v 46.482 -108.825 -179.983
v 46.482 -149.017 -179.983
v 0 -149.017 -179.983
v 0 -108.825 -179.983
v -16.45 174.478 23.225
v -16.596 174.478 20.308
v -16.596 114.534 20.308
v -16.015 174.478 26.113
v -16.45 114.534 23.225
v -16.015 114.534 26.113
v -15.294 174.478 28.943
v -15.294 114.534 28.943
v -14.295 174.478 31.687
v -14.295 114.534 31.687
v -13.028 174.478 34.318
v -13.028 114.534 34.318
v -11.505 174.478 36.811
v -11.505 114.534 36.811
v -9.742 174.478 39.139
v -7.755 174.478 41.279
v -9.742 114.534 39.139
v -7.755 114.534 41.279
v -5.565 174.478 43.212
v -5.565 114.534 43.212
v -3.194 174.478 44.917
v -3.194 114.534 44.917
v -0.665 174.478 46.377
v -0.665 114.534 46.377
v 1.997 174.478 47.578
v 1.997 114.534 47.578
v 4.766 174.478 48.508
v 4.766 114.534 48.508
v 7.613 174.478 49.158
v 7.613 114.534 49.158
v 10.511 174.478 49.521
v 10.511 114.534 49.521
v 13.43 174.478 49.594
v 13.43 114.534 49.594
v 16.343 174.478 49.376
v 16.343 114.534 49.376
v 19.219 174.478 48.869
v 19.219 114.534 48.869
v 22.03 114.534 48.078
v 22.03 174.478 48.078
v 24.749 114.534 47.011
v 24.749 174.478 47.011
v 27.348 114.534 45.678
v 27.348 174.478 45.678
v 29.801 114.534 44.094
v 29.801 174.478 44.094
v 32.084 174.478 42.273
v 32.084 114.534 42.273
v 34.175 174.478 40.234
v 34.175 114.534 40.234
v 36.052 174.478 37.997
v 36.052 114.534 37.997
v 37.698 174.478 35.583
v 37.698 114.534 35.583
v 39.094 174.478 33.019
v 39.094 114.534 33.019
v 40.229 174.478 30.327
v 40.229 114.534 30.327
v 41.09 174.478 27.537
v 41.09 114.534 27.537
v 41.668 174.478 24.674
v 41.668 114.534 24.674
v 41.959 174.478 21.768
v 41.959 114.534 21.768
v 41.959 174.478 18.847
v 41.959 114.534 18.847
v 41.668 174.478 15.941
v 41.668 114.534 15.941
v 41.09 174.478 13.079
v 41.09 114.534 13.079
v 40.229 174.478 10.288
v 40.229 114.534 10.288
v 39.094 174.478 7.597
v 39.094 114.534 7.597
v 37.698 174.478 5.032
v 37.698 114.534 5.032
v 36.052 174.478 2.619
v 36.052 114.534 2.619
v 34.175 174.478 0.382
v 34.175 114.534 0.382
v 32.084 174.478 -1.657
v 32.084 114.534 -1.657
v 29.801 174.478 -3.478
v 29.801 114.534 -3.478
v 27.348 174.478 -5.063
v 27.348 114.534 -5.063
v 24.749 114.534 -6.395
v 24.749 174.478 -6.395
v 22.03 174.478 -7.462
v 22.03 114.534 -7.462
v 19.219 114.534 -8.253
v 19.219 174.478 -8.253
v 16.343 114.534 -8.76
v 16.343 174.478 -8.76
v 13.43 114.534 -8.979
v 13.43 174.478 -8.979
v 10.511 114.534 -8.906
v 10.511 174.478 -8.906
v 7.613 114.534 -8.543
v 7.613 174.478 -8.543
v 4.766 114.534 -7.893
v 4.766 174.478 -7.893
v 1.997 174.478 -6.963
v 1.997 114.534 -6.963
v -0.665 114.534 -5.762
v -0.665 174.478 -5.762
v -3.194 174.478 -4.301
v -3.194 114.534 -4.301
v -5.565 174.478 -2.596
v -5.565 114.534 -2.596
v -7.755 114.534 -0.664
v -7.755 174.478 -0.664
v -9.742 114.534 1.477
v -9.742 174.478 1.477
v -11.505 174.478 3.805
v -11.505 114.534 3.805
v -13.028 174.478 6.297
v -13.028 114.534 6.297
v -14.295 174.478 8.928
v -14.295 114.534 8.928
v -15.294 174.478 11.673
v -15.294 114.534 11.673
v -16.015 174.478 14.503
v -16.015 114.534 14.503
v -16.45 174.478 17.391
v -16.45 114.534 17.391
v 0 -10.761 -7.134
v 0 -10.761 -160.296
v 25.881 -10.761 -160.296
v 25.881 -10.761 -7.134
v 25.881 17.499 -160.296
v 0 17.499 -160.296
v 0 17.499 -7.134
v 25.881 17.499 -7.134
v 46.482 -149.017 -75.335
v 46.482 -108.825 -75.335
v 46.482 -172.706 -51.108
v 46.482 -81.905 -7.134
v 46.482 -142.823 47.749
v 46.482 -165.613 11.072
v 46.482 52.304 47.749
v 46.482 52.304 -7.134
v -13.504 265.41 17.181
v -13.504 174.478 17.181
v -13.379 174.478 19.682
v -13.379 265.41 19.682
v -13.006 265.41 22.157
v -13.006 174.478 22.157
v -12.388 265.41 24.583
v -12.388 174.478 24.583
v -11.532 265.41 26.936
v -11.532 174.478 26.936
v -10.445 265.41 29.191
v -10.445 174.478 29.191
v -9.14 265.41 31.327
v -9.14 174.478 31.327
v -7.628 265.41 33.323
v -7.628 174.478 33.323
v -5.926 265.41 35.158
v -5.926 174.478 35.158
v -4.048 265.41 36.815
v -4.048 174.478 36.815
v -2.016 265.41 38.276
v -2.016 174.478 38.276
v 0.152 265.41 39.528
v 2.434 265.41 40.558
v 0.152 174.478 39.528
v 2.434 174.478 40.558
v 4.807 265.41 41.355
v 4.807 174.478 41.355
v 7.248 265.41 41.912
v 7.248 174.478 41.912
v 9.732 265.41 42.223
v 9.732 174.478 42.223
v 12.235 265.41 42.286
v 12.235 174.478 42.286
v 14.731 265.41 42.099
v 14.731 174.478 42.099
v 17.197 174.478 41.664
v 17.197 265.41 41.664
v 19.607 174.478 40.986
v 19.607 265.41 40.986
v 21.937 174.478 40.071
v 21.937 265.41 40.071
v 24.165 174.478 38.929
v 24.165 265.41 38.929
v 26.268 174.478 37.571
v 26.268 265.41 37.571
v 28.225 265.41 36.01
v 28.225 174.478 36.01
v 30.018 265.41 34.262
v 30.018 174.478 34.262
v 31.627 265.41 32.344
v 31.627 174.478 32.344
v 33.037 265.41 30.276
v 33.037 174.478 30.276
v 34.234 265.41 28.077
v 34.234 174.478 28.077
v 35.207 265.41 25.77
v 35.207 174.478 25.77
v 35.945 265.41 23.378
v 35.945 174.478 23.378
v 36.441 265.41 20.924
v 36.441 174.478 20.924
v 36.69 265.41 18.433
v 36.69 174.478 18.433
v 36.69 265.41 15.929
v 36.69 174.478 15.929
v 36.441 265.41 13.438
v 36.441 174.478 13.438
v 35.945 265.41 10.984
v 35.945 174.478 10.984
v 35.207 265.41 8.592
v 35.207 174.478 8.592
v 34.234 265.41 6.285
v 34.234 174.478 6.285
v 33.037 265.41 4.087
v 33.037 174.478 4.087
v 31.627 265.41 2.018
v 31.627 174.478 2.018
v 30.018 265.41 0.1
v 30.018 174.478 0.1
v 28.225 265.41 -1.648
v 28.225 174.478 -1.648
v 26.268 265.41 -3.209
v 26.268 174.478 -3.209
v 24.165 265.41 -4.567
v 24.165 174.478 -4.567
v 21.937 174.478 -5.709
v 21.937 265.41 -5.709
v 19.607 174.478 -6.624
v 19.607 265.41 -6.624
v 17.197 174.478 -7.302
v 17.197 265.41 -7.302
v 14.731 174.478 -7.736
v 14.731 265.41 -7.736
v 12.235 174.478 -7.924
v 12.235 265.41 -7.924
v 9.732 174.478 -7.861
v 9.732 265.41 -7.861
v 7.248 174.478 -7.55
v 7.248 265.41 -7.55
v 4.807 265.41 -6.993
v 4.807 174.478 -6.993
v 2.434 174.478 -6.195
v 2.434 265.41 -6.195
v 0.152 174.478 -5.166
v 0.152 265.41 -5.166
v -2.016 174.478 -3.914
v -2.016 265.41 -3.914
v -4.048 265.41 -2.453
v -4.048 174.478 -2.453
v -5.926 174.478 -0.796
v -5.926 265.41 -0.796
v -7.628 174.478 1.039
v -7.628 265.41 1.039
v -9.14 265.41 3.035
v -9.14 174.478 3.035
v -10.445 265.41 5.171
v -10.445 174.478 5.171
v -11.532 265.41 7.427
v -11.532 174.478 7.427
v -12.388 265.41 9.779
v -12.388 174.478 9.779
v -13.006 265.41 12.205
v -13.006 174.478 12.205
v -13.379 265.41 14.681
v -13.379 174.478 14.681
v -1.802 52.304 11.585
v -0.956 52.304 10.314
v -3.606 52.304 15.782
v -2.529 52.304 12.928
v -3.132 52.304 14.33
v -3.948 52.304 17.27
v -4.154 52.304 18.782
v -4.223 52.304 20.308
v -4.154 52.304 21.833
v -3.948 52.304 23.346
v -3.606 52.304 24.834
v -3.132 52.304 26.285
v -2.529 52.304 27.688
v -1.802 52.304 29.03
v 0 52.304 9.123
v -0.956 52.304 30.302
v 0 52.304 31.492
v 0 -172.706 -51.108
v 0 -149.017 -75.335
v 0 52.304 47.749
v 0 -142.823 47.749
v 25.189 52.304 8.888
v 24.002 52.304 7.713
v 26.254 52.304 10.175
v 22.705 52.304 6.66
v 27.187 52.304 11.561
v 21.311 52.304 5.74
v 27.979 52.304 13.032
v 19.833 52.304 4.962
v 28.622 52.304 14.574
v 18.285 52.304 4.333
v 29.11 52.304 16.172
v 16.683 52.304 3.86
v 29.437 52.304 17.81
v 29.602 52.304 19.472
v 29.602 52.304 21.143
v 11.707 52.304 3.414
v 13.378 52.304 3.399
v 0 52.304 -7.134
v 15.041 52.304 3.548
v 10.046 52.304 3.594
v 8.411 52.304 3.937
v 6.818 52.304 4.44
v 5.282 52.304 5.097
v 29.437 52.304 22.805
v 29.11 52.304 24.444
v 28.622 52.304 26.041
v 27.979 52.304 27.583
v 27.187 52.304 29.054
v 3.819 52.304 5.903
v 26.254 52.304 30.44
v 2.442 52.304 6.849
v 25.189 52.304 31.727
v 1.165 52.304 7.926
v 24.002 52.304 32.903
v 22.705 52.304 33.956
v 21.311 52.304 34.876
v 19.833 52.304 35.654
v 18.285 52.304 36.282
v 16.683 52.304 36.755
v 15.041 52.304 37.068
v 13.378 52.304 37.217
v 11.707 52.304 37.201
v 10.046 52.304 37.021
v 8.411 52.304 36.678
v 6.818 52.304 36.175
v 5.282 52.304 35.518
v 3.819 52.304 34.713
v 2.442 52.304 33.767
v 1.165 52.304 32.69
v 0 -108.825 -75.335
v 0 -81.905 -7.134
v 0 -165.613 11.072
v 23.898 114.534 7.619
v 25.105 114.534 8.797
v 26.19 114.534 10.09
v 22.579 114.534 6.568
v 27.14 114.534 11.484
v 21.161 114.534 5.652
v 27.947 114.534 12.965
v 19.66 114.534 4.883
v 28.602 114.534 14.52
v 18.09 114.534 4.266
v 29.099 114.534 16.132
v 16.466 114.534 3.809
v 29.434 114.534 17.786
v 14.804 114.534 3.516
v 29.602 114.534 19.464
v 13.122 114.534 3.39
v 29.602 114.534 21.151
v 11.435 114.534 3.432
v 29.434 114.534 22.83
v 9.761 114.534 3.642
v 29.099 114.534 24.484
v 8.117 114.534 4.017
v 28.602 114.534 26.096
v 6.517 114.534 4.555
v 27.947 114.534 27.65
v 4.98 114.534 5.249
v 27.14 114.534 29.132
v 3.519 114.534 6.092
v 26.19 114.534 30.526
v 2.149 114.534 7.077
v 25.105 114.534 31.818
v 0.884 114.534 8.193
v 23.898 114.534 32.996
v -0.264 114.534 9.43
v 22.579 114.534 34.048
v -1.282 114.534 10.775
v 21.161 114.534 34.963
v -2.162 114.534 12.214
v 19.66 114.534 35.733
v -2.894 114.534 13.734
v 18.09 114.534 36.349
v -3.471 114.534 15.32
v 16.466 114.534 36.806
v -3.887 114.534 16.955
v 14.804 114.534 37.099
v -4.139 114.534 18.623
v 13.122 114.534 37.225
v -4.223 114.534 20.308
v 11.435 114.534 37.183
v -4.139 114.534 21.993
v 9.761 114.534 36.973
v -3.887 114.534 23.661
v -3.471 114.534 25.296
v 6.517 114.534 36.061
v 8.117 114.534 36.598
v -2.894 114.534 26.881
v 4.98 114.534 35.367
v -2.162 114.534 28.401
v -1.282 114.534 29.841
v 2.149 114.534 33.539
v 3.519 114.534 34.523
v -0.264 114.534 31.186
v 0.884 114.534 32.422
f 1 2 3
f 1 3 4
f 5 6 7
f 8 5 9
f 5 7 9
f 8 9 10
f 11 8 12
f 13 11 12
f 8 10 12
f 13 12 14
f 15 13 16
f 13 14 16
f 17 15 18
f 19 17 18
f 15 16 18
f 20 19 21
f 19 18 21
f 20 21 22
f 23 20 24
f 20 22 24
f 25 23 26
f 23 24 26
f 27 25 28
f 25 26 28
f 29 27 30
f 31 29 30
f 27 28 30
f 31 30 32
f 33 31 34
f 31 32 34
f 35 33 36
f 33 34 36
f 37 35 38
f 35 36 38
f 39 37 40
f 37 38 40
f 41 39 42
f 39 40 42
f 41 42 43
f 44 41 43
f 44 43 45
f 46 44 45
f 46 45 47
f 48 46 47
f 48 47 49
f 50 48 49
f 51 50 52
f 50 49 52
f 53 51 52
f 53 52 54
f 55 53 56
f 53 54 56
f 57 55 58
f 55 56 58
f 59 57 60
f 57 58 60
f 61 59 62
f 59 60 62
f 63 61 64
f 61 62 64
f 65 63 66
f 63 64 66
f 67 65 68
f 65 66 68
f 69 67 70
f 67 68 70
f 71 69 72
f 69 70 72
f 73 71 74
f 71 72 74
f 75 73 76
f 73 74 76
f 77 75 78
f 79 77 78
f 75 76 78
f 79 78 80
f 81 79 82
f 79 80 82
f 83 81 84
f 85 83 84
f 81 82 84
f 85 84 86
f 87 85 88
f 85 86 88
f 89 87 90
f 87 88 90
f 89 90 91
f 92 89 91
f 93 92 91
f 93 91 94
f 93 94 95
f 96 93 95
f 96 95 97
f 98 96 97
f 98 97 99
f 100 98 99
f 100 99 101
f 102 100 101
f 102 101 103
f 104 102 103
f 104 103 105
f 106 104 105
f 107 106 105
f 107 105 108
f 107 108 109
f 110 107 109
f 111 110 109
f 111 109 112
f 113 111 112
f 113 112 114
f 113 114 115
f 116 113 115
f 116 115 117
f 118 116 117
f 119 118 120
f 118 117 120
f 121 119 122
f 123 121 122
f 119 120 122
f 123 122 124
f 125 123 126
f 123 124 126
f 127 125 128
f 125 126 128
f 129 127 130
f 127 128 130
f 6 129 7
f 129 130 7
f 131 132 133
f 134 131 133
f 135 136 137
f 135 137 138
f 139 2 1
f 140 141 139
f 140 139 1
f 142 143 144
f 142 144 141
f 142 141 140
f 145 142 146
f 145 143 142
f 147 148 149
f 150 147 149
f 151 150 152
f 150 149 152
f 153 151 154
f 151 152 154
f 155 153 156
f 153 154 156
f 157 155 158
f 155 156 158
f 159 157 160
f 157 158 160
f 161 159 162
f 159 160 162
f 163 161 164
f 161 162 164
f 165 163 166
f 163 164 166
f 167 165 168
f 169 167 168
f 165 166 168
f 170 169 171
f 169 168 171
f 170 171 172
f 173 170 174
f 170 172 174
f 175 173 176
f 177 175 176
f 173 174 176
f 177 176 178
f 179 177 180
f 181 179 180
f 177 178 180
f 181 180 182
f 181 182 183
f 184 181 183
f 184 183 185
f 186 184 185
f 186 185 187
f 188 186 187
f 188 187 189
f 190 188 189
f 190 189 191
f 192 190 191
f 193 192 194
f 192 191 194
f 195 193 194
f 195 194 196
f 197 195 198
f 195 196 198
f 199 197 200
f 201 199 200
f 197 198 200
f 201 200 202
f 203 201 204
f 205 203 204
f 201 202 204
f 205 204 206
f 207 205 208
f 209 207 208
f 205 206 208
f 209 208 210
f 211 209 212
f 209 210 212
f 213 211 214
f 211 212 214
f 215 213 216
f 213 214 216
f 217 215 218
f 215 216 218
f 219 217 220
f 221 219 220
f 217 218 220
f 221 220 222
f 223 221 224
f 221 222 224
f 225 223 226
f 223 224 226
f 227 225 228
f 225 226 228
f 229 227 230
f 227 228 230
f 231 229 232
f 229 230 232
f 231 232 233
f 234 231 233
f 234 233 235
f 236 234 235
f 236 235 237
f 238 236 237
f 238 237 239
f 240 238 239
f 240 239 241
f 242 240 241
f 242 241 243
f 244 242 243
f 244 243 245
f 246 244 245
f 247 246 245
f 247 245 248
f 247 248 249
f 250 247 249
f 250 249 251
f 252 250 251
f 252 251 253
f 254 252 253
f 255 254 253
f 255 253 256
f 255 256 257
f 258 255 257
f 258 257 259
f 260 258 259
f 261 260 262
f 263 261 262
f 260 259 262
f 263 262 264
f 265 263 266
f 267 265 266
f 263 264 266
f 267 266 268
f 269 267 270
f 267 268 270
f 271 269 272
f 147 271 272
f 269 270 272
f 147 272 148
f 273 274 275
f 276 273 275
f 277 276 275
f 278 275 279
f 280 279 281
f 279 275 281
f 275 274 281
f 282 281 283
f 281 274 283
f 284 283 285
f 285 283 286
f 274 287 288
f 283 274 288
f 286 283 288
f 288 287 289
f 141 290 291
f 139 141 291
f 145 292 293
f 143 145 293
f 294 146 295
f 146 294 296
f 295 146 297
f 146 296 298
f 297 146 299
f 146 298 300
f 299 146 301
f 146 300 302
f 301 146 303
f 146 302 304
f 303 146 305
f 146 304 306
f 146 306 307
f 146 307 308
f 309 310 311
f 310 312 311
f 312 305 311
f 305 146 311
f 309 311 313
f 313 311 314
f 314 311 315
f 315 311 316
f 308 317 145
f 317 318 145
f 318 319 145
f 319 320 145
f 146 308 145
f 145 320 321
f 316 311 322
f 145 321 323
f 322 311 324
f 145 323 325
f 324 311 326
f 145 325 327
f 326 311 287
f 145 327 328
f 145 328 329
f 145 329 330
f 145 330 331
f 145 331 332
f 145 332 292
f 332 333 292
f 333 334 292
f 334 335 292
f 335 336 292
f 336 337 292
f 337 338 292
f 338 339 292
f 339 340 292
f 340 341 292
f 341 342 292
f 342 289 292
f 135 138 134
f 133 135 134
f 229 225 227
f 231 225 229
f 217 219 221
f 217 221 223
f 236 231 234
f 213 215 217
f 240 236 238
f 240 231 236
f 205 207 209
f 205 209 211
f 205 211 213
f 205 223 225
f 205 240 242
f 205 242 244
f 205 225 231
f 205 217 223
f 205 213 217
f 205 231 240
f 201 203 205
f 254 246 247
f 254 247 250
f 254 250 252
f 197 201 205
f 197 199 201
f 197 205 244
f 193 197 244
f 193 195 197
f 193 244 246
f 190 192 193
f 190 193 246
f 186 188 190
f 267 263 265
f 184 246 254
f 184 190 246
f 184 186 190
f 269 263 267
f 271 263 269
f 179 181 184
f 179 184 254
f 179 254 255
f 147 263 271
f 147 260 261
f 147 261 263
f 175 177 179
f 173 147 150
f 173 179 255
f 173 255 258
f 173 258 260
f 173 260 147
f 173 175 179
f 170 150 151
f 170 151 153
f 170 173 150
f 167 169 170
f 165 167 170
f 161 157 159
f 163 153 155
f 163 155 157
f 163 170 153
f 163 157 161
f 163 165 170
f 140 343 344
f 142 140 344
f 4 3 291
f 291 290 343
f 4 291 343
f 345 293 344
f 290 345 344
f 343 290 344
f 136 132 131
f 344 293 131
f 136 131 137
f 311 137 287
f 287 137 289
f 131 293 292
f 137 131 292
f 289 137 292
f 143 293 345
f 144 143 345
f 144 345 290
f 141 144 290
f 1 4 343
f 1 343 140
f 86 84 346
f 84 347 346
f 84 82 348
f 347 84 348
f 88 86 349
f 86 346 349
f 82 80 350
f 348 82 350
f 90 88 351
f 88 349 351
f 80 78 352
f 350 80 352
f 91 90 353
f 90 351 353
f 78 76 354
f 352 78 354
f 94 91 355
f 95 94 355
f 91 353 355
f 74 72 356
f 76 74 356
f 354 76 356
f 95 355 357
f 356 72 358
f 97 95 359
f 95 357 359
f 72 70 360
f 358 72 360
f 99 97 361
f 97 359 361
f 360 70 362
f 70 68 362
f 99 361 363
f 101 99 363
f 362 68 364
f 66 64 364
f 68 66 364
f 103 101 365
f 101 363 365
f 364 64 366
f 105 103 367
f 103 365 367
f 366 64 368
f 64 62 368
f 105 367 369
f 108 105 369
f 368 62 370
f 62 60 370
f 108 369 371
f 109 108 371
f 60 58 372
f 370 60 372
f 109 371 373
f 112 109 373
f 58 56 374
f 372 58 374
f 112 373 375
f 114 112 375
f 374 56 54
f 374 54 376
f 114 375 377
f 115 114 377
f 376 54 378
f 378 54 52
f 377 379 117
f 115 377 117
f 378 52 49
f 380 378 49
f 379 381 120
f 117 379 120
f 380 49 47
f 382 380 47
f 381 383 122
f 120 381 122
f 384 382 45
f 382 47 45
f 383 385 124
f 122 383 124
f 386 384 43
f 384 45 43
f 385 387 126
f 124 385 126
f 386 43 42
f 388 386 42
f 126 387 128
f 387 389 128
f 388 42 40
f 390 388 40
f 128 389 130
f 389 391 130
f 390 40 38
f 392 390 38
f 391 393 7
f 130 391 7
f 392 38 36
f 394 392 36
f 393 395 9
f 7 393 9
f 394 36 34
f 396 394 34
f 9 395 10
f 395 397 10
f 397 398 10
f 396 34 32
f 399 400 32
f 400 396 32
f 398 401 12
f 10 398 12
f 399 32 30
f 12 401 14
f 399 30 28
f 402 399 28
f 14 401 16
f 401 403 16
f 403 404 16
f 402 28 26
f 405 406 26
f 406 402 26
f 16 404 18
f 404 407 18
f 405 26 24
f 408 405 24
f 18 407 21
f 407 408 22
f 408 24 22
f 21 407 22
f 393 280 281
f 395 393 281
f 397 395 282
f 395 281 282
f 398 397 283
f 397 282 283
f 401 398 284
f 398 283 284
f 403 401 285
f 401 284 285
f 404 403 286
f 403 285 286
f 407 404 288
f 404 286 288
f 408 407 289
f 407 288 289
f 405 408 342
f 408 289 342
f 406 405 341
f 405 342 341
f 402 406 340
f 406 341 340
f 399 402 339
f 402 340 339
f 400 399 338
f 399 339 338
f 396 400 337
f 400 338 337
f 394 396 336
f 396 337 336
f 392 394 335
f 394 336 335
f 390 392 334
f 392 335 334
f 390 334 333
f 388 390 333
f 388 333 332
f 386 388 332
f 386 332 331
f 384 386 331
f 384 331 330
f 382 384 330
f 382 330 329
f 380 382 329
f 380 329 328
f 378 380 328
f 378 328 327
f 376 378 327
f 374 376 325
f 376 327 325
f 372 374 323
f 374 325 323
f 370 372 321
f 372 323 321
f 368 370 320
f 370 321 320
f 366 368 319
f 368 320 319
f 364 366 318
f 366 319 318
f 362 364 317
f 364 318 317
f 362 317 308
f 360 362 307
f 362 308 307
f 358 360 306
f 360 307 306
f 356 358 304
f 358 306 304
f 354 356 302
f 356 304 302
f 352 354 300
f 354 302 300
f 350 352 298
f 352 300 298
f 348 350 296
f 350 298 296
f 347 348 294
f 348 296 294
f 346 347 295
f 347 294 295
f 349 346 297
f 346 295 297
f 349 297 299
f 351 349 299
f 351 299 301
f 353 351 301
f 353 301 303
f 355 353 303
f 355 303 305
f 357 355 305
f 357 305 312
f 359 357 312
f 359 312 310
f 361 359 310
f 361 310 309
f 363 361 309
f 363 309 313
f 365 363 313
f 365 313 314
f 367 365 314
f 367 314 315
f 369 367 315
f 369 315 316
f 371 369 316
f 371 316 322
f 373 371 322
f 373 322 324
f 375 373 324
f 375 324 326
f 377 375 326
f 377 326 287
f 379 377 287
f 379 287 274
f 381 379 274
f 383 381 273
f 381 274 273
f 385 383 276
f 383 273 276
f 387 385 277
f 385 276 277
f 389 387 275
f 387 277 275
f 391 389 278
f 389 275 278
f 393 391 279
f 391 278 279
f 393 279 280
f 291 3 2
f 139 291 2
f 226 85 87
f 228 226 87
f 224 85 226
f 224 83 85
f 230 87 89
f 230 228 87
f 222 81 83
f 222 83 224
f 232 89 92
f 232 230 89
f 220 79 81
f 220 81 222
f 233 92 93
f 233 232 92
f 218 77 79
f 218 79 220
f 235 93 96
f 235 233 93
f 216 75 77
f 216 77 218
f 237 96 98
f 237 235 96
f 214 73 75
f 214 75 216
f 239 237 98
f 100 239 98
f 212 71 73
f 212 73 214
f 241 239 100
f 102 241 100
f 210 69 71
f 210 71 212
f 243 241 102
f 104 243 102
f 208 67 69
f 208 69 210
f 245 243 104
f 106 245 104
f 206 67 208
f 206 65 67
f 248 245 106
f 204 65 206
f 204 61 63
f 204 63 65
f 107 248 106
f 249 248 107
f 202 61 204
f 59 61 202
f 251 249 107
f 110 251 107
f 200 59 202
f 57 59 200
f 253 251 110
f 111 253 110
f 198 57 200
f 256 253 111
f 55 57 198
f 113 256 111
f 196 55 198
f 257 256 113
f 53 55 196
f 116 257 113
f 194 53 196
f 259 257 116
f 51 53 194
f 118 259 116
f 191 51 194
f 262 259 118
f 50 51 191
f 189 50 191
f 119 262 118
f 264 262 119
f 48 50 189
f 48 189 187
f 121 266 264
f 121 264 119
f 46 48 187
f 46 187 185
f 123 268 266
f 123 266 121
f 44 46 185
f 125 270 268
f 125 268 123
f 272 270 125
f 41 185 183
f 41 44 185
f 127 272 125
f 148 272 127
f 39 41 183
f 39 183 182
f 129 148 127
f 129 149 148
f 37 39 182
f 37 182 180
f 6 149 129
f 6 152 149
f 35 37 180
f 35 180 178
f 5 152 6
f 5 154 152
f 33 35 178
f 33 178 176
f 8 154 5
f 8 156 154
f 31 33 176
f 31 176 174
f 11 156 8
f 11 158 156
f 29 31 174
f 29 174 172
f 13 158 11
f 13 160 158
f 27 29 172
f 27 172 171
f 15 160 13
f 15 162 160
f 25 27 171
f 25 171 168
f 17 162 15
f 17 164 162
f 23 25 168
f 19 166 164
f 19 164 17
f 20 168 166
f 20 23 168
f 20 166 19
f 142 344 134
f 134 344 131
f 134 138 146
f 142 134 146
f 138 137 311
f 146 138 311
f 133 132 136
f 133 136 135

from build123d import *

# Parameters (mm, degrees)
F0_W      = 134.2095732689
F0_H      = 54.8827461898
F1_DEPTH  = 25.4
F2_R      = 16.9227775992
F3_DEPTH  = 62.23
F4_R      = 29.2955411645
F5_DEPTH  = 59.944
F6_DEPTH  = 46.482
F8_W      = 25.8811749518
F8_H      = 28.2603334635
F9_DEPTH  = 153.162
F11_R     = 25.1124764346
F12_DEPTH = 90.932
F13_DEPTH = 104.648


with BuildPart() as f1:
    # F0 (on Right) → F1 (new body)
    with BuildSketch(Plane.YZ):
        Polygon((-81.9051712751, -7.1336217225), (-81.9051712751, 47.7491244674), (-142.8231298923, 47.7491244674), (-165.6134873629, 11.0719772056), (-172.7062016726, -51.1080250144), (-149.0172445774, -75.3351673484), (-108.8246330619, -75.3351673484), align=None)
        with Locations((-14.8003846407, 20.3077513725)):
            Rectangle(F0_W, F0_H)
    extrude(amount=F1_DEPTH)

    # F2 (on face) → F3 (join)
    with BuildSketch(Plane(origin=(0, 52.3044019938, 0), x_dir=(-1, 0, 0), z_dir=(0, 1, 0))):
        with Locations((-12.7, 20.3077513725)):
            Circle(F2_R)
    extrude(amount=F3_DEPTH)

    # F4 (on face) → F5 (join)
    with BuildSketch(Plane(origin=(0, 114.5344019938, 0), x_dir=(-1, 0, 0), z_dir=(0, 1, 0))):
        with Locations((-12.7, 20.3077513725)):
            Circle(F4_R)
    extrude(amount=F5_DEPTH)

    # F0 (on Right) → F6 (join)
    with BuildSketch(Plane.YZ):
        Polygon((-81.9051712751, -7.1336217225), (-81.9051712751, 47.7491244674), (-142.8231298923, 47.7491244674), (-165.6134873629, 11.0719772056), (-172.7062016726, -51.1080250144), (-149.0172445774, -75.3351673484), (-108.8246330619, -75.3351673484), align=None)
        with Locations((-14.8003846407, 20.3077513725)):
            Rectangle(F0_W, F0_H)
    extrude(amount=F6_DEPTH)

    # F8 (on face) → F9 (join)
    with BuildSketch(Plane(origin=(0, 0, -7.1336217225), x_dir=(1, 0, 0), z_dir=(0, 0, -1))):
        with Locations((12.9405874759, -3.3692447469)):
            Rectangle(F8_W, F8_H)
    extrude(amount=F9_DEPTH)

    # F11 (on face) → F12 (join)
    with BuildSketch(Plane(origin=(0, 174.4784019938, 0), x_dir=(-1, 0, 0), z_dir=(0, 1, 0))):
        with Locations((-11.6089172661, 17.1811357141)):
            Circle(F11_R)
    extrude(amount=F12_DEPTH)

    # F13 (add): a face of the model
    f13_faces = [f1.faces().sort_by_distance(p)[0] for p in [
        (23.241, -128.9209388196, -75.3351673484),
    ]]
    extrude(f13_faces, amount=F13_DEPTH)


solid = f1.part
